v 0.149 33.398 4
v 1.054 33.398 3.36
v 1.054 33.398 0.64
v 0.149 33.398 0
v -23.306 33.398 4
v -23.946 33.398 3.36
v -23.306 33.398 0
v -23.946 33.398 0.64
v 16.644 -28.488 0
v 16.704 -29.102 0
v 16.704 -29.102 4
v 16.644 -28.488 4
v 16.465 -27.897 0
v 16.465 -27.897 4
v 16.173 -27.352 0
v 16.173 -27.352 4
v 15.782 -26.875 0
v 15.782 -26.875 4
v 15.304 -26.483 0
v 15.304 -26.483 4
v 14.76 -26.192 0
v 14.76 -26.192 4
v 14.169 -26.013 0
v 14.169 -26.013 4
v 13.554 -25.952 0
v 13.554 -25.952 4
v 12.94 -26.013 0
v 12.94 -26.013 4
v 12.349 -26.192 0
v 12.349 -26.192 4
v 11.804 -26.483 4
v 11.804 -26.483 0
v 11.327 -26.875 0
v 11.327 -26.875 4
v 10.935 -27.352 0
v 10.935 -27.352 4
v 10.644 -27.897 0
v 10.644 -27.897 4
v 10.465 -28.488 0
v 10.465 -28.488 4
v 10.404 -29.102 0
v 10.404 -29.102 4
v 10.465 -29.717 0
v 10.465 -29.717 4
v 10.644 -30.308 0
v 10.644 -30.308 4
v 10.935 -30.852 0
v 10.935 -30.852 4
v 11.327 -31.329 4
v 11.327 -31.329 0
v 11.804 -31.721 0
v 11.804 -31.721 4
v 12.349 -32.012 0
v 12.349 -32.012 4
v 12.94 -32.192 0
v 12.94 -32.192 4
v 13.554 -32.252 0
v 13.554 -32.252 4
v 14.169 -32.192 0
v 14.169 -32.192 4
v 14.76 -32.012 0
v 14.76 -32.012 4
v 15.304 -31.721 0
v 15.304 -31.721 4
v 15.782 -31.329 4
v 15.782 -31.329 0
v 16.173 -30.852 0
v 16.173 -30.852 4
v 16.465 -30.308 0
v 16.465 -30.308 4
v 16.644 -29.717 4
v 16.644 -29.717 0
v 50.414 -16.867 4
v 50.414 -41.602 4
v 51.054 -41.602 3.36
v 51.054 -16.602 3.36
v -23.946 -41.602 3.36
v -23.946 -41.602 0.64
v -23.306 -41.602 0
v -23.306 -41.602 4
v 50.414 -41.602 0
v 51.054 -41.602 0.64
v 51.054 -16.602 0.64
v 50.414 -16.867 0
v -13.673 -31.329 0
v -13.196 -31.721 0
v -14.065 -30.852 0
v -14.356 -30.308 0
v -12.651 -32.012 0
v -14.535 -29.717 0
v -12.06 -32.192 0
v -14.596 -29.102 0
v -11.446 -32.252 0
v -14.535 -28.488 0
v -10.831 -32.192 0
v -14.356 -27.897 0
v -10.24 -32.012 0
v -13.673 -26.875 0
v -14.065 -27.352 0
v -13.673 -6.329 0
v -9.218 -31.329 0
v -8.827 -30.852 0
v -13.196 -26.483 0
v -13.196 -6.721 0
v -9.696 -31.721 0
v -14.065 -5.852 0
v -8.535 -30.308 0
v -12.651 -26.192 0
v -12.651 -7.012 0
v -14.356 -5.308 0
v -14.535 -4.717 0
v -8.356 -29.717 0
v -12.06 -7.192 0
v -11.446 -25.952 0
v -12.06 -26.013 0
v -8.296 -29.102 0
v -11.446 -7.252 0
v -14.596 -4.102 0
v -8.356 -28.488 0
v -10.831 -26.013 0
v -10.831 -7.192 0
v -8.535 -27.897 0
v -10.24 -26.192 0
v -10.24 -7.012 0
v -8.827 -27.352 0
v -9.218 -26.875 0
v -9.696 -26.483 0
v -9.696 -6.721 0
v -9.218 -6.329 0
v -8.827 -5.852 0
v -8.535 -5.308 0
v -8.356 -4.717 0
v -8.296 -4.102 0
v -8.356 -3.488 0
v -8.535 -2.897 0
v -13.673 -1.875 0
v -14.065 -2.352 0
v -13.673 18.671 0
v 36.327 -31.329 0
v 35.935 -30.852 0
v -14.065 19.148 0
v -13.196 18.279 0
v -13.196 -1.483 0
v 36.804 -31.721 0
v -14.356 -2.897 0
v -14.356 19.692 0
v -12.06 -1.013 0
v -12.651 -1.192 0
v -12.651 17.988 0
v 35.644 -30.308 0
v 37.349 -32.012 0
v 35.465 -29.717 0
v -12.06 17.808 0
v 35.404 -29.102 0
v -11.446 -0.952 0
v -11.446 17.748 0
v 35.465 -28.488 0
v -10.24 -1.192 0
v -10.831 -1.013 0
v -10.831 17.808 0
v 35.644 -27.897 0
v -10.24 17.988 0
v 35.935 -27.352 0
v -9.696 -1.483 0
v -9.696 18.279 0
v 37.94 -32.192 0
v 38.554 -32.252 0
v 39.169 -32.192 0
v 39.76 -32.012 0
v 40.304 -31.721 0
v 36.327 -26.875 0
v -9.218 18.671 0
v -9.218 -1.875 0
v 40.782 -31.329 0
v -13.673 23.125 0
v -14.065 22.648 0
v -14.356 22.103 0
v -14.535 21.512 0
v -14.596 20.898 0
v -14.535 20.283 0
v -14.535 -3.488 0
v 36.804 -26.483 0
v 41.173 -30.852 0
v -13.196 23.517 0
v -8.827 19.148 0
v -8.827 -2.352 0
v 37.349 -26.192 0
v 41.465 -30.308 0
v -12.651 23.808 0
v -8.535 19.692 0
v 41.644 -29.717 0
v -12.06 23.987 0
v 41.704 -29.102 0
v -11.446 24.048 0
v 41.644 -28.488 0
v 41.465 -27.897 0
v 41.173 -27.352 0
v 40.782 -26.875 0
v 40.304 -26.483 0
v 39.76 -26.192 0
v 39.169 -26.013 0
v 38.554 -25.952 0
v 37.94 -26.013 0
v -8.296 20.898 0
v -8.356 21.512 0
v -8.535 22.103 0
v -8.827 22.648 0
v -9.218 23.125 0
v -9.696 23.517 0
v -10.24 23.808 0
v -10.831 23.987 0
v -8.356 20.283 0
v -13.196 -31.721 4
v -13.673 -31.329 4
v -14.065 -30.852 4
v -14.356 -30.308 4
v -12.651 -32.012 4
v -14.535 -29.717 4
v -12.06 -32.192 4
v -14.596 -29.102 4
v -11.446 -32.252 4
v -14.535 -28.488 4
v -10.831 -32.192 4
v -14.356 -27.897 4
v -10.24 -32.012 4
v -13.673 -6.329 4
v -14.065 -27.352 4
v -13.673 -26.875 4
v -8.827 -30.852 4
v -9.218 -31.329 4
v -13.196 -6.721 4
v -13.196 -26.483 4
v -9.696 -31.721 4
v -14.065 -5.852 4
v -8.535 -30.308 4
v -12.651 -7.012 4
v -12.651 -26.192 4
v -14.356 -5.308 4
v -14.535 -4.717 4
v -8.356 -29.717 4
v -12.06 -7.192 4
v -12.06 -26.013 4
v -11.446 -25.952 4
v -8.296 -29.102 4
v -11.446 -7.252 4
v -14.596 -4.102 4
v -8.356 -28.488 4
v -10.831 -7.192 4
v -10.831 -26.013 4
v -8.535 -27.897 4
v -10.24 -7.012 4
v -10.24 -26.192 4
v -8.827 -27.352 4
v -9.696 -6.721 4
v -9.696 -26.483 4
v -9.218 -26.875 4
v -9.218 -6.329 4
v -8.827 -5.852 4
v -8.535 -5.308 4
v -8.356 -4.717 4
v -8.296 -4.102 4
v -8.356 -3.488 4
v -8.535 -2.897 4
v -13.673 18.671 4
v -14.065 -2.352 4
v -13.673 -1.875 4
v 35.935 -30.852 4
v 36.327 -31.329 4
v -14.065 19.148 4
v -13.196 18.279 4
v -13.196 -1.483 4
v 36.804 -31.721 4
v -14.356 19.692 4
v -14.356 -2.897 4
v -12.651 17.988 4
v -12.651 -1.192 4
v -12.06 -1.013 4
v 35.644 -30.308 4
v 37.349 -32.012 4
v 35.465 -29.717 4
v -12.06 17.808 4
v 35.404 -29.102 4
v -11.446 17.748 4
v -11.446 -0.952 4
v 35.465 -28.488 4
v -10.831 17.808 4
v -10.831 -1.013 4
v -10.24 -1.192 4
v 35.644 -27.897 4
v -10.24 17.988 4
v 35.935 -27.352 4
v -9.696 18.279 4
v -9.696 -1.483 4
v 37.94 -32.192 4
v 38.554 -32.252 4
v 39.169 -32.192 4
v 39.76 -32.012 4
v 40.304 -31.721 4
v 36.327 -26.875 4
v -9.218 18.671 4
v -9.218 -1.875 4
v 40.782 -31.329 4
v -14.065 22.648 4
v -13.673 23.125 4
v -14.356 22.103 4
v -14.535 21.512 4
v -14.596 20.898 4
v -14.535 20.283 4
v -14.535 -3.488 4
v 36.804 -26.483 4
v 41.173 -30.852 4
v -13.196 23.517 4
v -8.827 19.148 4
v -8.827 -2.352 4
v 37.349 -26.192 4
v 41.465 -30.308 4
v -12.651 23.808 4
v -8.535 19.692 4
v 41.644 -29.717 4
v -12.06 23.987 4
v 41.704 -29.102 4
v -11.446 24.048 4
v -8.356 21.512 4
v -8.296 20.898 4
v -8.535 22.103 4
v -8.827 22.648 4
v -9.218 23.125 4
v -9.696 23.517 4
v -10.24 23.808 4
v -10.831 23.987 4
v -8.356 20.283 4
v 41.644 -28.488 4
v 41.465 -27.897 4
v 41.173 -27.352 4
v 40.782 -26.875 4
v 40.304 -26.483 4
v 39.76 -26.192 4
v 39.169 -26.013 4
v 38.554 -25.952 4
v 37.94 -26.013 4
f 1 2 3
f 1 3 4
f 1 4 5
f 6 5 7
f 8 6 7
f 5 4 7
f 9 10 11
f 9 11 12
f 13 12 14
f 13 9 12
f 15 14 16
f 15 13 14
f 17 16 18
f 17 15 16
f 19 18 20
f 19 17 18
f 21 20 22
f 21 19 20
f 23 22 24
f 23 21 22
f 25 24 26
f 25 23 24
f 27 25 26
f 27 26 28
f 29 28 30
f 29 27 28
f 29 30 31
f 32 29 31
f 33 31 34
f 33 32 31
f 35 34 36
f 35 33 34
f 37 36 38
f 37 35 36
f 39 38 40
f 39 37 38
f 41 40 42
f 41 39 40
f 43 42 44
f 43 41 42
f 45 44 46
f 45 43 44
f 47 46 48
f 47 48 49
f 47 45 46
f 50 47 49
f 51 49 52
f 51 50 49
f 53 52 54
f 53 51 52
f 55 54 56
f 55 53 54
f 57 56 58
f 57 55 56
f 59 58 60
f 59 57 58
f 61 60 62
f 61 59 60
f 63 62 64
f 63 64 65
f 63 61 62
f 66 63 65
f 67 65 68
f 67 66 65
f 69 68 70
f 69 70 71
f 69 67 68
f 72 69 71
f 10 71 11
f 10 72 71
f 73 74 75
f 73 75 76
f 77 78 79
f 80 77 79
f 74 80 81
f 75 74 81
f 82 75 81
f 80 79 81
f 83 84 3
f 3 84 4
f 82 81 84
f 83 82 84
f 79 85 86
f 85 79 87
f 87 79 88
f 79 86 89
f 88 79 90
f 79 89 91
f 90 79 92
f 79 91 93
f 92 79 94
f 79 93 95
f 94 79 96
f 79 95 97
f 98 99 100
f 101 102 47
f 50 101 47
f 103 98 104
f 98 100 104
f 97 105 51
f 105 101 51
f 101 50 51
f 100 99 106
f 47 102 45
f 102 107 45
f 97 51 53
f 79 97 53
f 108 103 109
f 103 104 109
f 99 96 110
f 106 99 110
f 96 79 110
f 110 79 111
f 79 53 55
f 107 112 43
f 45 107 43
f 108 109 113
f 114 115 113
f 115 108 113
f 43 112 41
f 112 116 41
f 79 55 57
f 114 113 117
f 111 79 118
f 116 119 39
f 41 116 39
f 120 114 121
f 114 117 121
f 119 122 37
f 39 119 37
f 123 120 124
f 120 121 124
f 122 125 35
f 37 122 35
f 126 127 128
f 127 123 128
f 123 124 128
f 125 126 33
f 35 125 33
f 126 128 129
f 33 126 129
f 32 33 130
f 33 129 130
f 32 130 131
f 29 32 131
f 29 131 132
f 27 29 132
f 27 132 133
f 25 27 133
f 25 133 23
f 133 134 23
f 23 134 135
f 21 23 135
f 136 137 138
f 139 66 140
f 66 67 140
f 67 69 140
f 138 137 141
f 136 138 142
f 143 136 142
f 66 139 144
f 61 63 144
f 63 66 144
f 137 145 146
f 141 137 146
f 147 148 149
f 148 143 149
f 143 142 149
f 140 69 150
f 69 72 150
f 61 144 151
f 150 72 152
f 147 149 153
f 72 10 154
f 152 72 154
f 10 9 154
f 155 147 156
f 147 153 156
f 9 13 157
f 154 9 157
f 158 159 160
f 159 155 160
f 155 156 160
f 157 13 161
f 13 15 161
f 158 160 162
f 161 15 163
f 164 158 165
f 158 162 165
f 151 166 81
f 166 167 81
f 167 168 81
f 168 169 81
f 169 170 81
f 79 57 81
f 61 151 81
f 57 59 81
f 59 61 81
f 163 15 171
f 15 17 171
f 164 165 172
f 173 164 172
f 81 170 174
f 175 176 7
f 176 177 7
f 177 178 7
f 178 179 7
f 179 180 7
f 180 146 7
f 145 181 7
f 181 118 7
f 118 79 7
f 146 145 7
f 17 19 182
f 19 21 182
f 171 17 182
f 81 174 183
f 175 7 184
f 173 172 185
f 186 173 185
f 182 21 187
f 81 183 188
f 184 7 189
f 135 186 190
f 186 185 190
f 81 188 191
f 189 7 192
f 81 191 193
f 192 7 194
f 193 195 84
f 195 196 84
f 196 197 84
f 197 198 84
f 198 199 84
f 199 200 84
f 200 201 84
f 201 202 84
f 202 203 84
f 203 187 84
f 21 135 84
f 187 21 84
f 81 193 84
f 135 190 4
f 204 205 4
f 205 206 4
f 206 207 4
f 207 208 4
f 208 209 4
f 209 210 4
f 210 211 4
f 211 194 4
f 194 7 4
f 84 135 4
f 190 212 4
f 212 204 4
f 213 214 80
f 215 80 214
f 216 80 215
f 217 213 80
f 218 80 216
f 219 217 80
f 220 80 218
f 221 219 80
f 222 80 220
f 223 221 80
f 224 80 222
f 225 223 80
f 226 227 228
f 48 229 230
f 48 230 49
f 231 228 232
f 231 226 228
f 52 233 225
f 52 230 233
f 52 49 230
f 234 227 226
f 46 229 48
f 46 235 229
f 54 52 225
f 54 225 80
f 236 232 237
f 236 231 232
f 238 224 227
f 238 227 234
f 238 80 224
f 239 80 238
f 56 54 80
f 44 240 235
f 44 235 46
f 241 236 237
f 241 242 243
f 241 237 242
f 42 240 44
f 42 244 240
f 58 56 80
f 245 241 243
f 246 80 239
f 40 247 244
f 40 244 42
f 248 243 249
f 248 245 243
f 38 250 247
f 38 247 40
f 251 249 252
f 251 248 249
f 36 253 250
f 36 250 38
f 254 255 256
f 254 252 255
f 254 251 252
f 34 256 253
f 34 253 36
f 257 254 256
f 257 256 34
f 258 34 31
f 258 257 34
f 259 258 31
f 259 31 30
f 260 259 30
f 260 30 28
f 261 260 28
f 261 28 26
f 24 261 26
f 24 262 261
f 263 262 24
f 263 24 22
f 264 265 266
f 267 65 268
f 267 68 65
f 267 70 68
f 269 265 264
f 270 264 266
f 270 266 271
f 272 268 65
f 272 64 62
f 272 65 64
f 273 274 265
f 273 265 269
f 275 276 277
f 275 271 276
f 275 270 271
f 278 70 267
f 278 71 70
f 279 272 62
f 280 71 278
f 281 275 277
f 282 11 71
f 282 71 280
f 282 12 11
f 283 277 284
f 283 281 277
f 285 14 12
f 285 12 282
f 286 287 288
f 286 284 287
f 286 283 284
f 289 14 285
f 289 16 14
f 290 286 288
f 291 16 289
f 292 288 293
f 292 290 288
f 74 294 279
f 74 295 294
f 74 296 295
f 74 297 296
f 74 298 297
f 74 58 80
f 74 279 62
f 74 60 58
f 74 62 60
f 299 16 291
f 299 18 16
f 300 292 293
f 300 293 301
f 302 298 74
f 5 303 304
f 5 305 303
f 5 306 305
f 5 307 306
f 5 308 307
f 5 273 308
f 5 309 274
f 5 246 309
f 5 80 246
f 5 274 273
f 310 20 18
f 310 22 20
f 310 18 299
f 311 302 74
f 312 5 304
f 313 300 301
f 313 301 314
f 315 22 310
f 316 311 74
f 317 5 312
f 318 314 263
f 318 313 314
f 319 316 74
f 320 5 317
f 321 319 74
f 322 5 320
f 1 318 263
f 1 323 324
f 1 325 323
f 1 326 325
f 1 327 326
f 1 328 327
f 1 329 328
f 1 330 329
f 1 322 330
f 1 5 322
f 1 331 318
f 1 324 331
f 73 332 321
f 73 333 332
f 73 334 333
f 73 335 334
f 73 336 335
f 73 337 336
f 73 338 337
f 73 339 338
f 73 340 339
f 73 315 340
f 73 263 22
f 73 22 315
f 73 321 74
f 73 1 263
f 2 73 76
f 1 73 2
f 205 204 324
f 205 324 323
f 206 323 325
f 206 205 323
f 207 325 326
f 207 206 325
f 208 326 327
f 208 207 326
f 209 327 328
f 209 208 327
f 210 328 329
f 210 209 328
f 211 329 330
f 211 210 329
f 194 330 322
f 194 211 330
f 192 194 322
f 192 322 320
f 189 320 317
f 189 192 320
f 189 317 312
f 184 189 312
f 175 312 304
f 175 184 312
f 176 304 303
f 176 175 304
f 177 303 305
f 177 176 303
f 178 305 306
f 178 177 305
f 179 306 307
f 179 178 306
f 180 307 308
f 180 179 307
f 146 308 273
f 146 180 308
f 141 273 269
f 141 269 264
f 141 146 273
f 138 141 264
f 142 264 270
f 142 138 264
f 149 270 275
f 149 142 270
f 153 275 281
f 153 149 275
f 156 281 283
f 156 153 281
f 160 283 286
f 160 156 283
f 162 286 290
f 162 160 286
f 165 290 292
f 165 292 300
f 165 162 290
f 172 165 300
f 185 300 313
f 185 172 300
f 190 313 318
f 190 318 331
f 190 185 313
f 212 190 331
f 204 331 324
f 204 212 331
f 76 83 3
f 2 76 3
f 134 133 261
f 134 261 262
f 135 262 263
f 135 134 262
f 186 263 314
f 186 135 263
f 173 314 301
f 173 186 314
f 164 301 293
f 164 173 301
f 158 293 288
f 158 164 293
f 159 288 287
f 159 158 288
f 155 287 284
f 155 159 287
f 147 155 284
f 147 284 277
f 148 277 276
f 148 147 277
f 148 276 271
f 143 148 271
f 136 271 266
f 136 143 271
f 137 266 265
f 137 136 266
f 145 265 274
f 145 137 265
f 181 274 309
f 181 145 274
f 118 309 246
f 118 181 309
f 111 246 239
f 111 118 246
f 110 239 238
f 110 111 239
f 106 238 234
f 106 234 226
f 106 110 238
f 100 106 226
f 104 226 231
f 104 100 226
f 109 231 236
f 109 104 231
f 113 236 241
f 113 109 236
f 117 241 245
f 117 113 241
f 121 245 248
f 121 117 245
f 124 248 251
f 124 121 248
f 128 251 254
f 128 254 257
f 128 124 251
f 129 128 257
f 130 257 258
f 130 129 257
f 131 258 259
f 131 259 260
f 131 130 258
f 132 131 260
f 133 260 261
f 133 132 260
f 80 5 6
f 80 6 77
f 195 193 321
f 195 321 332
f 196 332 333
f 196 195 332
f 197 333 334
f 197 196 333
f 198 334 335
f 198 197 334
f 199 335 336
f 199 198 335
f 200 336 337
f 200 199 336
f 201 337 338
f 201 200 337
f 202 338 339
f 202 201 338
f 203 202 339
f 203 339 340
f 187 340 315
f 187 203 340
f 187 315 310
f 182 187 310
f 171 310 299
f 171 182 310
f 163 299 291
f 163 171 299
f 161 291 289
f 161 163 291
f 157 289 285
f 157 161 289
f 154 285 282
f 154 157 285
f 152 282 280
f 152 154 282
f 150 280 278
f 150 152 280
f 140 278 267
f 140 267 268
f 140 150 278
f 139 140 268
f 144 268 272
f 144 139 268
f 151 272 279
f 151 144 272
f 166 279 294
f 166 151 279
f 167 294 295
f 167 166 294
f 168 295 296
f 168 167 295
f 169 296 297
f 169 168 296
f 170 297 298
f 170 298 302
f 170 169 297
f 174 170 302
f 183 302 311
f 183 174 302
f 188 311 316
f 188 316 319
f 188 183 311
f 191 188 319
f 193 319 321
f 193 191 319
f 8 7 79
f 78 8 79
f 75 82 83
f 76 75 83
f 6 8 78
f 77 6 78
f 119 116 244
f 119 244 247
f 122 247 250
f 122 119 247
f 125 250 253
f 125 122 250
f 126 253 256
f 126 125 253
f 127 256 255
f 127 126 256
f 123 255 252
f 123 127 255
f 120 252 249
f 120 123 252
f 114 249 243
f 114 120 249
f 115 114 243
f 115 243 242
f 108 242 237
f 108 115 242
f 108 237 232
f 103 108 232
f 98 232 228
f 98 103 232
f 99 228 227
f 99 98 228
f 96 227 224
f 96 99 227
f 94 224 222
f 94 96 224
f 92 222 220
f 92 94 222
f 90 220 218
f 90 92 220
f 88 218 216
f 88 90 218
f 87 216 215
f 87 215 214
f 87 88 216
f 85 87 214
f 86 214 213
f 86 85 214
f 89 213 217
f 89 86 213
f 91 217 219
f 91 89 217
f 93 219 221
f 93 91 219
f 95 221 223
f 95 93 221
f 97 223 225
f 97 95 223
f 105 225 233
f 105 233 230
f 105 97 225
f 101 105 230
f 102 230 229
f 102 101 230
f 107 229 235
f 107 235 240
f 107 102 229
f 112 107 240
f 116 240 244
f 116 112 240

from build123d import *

# Parameters (mm, degrees)
SKETCH1_R      = 3.15
EXTRUDE1_DEPTH = 4
CHAMFER1_SIZE  = 0.64


with BuildPart() as part:
    # Sketch1 → Extrude1 (new body)
    with BuildSketch(Plane.XY):
        Polygon((-23.945658648, 33.397892325), (-23.945658648, -41.602107675), (51.054341352, -41.602107675), (51.054341352, -16.602107675), (1.054341352, 33.397892325), align=None)
        with Locations((-11.445658648, -29.102107675)):
            Circle(SKETCH1_R, mode=Mode.SUBTRACT)
        with Locations((-11.445658648, -4.102107675)):
            Circle(SKETCH1_R, mode=Mode.SUBTRACT)
        with Locations((-11.445658648, 20.897892325)):
            Circle(SKETCH1_R, mode=Mode.SUBTRACT)
        with Locations((13.554341352, -29.102107675)):
            Circle(SKETCH1_R, mode=Mode.SUBTRACT)
        with Locations((38.554341352, -29.102107675)):
            Circle(SKETCH1_R, mode=Mode.SUBTRACT)
    extrude(amount=EXTRUDE1_DEPTH)

    # Chamfer1
    chamfer1_edges = [part.edges().sort_by_distance(p)[0] for p in [
        (51.054341352, -29.102107675, 4),
        (26.054341352, 8.397892325, 4),
        (26.054341352, 8.397892325, 0),
        (51.054341352, -29.102107675, 0),
        (-23.945658648, -4.102107675, 0),
        (-23.945658648, -4.102107675, 4),
    ]]
    chamfer(chamfer1_edges, length=CHAMFER1_SIZE)


solid = part.part
